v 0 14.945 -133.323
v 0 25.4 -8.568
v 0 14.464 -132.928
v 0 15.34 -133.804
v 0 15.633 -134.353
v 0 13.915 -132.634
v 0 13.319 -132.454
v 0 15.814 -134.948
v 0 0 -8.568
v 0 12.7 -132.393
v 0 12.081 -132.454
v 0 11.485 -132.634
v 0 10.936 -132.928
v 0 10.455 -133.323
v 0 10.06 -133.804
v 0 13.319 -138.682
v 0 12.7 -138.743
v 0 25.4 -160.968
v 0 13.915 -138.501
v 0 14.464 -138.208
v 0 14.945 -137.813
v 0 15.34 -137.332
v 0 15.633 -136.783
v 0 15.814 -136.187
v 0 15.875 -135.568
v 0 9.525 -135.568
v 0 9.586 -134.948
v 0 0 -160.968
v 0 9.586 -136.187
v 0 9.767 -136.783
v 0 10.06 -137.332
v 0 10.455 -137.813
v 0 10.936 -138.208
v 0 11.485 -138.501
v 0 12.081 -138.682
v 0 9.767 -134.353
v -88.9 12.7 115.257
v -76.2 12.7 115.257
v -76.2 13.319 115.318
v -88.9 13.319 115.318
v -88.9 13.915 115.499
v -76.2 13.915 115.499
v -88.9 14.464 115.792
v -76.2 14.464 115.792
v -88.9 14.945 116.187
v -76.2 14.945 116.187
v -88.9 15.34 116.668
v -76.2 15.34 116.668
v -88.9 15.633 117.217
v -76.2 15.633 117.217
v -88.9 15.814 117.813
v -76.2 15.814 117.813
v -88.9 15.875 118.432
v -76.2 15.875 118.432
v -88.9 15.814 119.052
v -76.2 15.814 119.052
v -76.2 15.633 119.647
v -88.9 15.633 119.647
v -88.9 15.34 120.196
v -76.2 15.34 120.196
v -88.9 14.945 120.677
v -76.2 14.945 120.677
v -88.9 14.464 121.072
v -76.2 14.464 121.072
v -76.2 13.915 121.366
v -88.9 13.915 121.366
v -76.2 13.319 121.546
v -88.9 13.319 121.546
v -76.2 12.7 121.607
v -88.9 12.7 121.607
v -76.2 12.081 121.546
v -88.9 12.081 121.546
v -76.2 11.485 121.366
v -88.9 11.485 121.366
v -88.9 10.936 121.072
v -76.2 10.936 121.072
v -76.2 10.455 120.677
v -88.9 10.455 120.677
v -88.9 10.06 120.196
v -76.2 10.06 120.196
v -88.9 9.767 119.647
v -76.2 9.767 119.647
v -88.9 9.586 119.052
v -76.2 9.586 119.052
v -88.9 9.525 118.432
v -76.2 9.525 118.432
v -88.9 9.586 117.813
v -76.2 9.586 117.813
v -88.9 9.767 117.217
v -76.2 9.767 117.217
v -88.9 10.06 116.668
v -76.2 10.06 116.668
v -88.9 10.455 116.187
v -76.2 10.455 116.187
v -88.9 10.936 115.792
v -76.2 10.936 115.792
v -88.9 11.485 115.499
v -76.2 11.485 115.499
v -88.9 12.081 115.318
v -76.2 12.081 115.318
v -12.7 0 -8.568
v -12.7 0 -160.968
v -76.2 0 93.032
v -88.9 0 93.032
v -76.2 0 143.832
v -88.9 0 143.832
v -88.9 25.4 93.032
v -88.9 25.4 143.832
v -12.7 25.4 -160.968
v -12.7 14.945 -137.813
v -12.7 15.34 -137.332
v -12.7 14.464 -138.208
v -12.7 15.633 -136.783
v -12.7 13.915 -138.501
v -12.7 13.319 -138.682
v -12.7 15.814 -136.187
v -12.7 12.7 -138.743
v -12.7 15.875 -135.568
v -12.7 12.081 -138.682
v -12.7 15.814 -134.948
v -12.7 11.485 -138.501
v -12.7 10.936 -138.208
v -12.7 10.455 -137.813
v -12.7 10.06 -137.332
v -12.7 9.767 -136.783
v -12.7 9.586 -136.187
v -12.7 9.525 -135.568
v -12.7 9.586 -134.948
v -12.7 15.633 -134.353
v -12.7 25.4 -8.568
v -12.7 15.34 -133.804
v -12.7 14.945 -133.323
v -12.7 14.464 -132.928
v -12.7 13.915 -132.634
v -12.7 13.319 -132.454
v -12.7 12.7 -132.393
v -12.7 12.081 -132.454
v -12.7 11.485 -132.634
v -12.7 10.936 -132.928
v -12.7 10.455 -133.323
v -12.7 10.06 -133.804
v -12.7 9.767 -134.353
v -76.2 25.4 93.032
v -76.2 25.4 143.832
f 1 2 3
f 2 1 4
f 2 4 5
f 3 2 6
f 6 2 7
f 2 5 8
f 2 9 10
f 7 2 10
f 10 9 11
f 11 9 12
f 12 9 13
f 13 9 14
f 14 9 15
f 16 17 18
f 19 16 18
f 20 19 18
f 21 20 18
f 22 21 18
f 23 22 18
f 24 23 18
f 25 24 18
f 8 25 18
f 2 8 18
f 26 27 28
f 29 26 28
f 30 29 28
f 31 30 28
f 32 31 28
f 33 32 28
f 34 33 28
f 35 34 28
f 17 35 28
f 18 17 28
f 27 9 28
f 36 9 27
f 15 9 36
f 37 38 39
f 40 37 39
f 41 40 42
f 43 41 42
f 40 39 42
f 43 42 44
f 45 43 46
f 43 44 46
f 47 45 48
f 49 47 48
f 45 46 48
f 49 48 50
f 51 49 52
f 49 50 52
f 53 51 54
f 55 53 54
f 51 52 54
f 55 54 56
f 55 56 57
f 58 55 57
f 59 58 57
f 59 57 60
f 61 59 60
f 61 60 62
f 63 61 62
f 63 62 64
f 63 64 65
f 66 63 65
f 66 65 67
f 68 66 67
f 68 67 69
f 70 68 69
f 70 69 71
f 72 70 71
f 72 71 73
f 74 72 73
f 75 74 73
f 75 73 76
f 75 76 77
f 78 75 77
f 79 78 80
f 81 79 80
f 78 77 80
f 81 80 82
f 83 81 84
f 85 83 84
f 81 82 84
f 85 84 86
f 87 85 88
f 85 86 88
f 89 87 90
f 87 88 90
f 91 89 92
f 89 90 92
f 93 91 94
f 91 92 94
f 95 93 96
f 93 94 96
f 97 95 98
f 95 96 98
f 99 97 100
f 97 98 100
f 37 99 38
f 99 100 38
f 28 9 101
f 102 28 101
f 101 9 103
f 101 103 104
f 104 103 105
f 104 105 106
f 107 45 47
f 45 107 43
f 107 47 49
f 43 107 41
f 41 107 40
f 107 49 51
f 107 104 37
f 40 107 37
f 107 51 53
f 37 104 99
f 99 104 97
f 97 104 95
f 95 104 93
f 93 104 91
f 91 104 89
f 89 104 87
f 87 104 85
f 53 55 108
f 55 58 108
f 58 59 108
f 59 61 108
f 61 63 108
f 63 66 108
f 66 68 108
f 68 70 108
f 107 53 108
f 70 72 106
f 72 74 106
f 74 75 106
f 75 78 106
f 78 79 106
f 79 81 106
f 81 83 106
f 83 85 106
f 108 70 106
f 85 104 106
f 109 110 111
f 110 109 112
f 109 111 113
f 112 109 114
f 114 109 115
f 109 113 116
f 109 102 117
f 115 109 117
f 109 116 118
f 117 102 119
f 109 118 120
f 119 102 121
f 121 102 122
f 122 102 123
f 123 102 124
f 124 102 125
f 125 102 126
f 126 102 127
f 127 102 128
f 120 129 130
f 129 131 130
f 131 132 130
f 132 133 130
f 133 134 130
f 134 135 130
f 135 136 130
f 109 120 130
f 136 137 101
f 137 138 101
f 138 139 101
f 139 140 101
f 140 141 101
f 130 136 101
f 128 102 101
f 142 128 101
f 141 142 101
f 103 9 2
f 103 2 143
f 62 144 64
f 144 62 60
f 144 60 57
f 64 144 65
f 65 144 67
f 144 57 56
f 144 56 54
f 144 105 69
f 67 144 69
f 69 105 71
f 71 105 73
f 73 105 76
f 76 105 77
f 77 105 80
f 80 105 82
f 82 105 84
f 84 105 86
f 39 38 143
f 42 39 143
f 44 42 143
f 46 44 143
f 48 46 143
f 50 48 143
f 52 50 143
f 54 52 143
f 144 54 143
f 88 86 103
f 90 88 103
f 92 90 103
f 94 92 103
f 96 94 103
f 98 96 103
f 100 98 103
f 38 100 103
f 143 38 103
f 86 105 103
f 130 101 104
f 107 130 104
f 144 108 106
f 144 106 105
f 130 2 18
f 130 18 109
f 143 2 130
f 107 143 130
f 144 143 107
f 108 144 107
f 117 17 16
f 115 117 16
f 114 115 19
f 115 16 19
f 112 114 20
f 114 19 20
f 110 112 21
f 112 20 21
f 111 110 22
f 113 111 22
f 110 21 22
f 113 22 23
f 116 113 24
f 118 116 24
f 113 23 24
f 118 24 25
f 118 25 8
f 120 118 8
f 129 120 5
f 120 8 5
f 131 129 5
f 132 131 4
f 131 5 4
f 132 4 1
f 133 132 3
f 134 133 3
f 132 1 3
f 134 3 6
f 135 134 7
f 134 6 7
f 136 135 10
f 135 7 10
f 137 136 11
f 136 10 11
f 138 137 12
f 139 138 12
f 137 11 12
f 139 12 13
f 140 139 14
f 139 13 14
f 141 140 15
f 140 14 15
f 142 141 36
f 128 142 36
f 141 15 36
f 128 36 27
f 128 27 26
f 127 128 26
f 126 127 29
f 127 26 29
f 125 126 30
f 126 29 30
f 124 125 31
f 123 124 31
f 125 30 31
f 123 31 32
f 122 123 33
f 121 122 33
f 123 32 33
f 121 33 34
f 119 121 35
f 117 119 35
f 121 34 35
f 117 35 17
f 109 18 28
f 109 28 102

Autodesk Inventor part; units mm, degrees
ref_plane "YZ Plane" through (0, 0, 0) normal (1, 0, 0) x (0, 1, 0)
ref_plane "XZ Plane" through (0, 0, 0) normal (0, 1, 0) x (-1, 0, 0)
ref_plane "XY Plane" through (0, 0, 0) normal (0, 0, 1) x (1, 0, 0)
sketch "Sketch1" plane through (0, 0, 0) normal (0, 1, 0) x (-1, 0, 0)
  line L0 (127, 143.8324) -> (0, 143.8324)
  line L1 (0, 143.8324) -> (0, -160.9676)
  line L2 (0, -160.9676) -> (127, -160.9676)
  line L3 (127, -160.9676) -> (127, 143.8324)
  line L4 (0, -160.9676) -> (12.7, -160.9676)
  line L5 (12.7, -160.9676) -> (12.7, -8.5676)
  line L6 (12.7, -8.5676) -> (0, -8.5676)
  line L7 (0, -8.5676) -> (0, -160.9676)
  line L8 (12.7, -8.5676) -> (88.9, 93.0324)
  line L9 (0, -8.5676) -> (76.2, 93.0324)
  line L10 (127, 143.8324) -> (76.2, 143.8324)
  line L11 (76.2, 143.8324) -> (76.2, 93.0324)
  line L12 (88.9, 93.0324) -> (127, 93.0324)
  line L13 (127, 93.0324) -> (127, 143.8324)
  line L14 (88.9, 93.0324) -> (88.9, 143.8324)
  point P0 (0, 0)
  point P1 (114.3, 143.8324)
  dimension "d0" = 304.8
  dimension "d1" = 127
  dimension "d2" = 12.7
  dimension "d3" = 152.4
  dimension "d16" = 50.8
  dimension "d17" = 0
  dimension "d18" = 12.7
extrude "Extrusion1" add sketch "Sketch1" along normal blind 25.4 contours L14 L8 L6 L9 L11 L0 | L5 L2 L1 L6
sketch "Sketch2" plane through (0, 0, -8.5676) normal (1, 0, 0) x (0, 0, -1)
  circle A0 centre (127, 12.7) radius 3.175
  line L0 (0, 0) -> (152.4, 0) projected
  line L1 (152.4, 0) -> (152.4, 25.4) projected
  point P0 (-8.5676, 0)
  dimension "d6" = 6.35
  dimension "d7" = 12.7
  dimension "d8" = 25.4
extrude "Extrusion2" cut sketch "Sketch2" against normal through all
sketch "Sketch4" plane through (-76.2, 0, 143.8324) normal (1, 0, 0) x (0, 0, -1)
  circle A0 centre (25.4, 12.7) radius 3.175
  line L0 (0, 0) -> (50.8, 0) projected
  line L1 (0, 0) -> (0, 25.4) projected
  point P0 (143.8324, 0)
  dimension "d19" = 6.35
  dimension "d20" = 12.7
  dimension "d21" = 25.4
extrude "Extrusion4" cut sketch "Sketch4" against normal through all
properties part number "arm2"
